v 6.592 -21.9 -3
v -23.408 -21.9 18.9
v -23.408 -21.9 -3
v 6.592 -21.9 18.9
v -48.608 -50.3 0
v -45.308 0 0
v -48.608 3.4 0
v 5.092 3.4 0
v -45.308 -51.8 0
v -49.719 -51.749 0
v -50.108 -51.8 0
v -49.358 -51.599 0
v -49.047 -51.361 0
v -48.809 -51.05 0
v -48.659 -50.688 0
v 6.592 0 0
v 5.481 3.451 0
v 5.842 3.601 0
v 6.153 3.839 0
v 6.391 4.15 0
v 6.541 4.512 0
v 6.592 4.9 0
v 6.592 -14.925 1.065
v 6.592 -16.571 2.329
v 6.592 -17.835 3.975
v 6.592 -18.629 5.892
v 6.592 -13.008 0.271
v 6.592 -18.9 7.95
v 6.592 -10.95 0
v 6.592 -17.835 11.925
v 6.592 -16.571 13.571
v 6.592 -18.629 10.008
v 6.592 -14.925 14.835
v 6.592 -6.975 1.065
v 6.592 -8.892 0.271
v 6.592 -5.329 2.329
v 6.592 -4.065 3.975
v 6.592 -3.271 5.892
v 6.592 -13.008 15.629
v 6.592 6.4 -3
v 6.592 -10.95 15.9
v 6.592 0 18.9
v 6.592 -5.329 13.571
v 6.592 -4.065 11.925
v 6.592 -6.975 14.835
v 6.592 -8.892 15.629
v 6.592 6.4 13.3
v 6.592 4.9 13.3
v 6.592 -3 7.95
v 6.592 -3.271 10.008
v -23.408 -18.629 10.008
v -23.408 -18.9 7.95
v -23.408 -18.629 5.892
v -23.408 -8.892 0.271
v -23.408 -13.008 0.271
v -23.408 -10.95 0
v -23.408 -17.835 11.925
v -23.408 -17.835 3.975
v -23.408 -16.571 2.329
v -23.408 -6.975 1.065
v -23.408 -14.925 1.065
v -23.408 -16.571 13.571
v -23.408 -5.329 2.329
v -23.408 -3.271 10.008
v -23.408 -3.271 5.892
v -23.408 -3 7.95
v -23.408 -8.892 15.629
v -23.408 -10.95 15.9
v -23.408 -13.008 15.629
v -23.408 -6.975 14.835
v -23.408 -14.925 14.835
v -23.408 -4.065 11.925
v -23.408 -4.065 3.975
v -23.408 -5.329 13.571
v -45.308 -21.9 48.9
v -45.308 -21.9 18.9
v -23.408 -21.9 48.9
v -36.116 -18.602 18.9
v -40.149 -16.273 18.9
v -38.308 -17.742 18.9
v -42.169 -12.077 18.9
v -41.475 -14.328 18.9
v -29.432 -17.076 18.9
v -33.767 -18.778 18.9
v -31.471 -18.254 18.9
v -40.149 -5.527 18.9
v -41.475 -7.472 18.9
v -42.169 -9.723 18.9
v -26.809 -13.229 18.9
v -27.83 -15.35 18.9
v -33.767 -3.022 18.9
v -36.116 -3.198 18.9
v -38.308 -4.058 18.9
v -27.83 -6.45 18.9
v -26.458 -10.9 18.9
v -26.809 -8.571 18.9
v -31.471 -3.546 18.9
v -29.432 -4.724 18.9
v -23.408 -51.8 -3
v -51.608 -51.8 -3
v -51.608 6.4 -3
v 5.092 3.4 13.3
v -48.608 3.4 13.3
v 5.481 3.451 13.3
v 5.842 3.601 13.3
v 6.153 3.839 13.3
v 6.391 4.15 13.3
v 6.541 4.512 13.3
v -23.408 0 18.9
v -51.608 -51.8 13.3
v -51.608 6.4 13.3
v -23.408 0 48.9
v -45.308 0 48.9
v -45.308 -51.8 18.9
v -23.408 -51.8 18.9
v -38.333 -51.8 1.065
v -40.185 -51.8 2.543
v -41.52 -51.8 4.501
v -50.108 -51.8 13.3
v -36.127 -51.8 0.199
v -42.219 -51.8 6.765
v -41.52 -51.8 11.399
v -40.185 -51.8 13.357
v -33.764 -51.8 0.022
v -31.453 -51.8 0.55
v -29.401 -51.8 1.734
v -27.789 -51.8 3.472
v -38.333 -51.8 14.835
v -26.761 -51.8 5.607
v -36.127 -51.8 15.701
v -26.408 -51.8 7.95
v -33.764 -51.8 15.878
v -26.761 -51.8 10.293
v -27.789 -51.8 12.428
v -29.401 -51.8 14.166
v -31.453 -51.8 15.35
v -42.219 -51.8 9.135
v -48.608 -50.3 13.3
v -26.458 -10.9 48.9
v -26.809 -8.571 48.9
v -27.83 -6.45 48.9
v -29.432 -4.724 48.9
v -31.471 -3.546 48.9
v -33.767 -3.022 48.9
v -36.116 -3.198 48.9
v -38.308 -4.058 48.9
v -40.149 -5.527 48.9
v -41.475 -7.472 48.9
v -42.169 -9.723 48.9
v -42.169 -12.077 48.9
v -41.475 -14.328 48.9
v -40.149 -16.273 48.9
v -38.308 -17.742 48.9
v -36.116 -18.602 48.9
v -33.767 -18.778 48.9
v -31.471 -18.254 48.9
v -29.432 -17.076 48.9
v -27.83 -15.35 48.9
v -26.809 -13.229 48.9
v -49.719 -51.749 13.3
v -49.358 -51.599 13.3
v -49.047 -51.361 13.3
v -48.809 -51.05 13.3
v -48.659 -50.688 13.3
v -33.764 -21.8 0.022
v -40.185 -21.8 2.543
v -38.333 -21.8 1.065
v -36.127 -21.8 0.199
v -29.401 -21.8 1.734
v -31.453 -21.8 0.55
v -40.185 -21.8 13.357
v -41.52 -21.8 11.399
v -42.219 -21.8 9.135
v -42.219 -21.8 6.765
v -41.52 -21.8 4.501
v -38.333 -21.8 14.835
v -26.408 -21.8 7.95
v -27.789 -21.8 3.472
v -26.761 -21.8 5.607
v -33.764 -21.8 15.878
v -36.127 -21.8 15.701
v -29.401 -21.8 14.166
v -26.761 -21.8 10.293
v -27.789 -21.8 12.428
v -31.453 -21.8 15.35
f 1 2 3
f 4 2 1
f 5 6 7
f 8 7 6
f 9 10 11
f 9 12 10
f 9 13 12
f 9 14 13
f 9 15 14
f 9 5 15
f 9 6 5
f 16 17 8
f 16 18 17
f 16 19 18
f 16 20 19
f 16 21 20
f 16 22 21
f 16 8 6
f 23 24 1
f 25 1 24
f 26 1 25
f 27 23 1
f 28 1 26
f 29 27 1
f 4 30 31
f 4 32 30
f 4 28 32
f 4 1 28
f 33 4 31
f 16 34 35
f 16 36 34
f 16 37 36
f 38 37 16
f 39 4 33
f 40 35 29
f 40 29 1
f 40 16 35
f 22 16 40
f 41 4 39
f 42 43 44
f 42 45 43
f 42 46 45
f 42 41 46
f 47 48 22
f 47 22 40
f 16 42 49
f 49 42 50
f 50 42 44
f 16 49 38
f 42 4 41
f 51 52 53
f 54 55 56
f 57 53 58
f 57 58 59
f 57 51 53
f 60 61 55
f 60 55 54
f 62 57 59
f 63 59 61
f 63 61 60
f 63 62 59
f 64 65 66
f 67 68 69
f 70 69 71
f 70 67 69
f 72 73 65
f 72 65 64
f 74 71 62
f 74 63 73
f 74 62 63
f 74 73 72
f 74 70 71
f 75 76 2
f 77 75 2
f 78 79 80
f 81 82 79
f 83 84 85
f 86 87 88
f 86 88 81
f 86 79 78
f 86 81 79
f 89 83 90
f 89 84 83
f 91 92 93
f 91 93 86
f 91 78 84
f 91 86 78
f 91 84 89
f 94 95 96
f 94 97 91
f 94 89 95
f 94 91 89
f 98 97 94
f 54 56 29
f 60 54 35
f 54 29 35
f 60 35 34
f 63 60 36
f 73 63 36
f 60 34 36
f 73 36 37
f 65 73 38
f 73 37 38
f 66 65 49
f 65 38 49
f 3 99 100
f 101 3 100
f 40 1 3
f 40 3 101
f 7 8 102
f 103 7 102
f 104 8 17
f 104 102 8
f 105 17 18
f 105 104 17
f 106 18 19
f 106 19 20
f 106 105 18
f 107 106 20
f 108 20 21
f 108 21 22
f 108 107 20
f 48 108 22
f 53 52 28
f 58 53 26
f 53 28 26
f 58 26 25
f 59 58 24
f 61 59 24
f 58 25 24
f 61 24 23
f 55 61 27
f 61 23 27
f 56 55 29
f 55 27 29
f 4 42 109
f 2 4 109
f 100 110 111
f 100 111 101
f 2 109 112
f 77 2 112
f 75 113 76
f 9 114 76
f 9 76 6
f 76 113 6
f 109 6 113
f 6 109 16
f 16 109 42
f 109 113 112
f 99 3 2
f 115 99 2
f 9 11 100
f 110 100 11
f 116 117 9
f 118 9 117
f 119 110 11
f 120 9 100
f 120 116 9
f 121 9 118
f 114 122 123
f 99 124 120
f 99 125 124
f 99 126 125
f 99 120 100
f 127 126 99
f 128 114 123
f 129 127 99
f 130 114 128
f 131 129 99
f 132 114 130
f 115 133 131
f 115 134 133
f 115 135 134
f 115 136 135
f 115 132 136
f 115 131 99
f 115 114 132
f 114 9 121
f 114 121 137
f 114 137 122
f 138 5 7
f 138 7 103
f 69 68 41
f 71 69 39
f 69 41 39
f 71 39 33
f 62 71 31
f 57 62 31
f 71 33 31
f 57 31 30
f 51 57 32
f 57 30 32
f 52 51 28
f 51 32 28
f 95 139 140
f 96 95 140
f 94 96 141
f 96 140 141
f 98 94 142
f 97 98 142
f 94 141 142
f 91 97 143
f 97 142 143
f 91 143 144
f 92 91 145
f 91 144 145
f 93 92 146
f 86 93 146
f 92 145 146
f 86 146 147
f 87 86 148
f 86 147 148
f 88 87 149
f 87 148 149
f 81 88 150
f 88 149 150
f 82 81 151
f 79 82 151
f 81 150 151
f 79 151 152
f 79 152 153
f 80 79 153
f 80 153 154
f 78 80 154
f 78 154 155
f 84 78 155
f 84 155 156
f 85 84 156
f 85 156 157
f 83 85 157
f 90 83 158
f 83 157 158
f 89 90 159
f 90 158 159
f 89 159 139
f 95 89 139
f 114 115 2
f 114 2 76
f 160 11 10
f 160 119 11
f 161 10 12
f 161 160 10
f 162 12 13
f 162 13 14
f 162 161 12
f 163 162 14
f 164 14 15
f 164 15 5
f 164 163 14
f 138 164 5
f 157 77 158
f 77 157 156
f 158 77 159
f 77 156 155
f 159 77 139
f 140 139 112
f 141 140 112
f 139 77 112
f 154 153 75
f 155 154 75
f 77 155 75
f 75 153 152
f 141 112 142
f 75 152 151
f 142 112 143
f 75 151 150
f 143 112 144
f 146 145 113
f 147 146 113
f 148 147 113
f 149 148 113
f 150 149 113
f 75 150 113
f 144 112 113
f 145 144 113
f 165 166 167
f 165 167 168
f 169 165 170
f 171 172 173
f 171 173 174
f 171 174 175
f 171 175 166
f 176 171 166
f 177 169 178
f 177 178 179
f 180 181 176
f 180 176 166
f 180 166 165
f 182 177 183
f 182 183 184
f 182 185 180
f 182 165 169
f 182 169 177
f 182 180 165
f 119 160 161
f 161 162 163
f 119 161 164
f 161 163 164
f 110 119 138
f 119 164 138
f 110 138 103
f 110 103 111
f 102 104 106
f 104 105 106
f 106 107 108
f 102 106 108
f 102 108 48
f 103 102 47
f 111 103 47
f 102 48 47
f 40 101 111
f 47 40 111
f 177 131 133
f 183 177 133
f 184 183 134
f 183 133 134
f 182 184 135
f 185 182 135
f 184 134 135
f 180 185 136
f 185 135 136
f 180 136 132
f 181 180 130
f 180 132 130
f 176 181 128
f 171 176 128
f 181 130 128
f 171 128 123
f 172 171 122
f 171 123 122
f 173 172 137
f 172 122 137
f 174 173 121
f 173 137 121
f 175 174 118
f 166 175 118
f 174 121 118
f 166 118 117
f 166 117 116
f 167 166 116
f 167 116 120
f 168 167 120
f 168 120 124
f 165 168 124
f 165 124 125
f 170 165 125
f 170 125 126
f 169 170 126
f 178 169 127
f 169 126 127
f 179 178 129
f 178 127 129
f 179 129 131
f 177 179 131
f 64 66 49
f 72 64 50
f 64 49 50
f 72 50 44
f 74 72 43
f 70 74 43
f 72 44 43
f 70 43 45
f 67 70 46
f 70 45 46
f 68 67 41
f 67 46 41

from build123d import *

# Parameters (mm, degrees)
F0_W      = 27
F0_H      = 15.9
F0_W_2    = 15.9
F0_H_2    = 27
F0_W_3    = 3
F0_H_3    = 3
F1_DEPTH  = 21.9
F2_DEPTH  = 51.8
F3_R      = 7.95
F6_DEPTH  = 30
F7_DEPTH  = 30
F4_R      = 7.9
F8_DEPTH  = 30
F10_DEPTH = 58.2
F11_W     = 3
F11_H     = 13.3
F13_R     = 1.5


with BuildPart() as f1:
    # F0 (on Front) → F1 (new body)
    with BuildSketch(Plane.XZ):
        with BuildLine():
            Line((-34.3576915575, 15.9), (-42.3076915575, 15.9))
            Line((-42.3076915575, 15.9), (-42.3076915575, 7.9499999931))
            ThreePointArc((-42.3076915575, 7.9499999931), (-39.9791904704, 13.571498908), (-34.3576915575, 15.9))
        make_face()
        with BuildLine():
            ThreePointArc((-34.3576915575, 15.9), (-39.9791904704, 13.571498908), (-42.3076915575, 7.9499999931))
            ThreePointArc((-42.3076915575, 7.9499999931), (-39.9791904655, 2.3285010871), (-34.3576915575, 0))
            ThreePointArc((-34.3576915575, 0), (-28.7361926471, 2.3285010896), (-26.4076915575, 7.95))
            ThreePointArc((-26.4076915575, 7.95), (-28.7361926471, 13.5714989104), (-34.3576915575, 15.9))
        make_face()
        Polygon((-42.3076915575, 18.9), (-42.3076915575, 45.9), (-26.4076915575, 45.9), (-26.4076915575, 18.9), (-23.4076915575, 18.9), (-23.4076915575, 48.9), (-45.3076915575, 48.9), (-45.3076915575, 18.9), align=None)
        with Locations((-9.9076915575, 7.95)):
            Rectangle(F0_W, F0_H)
        with Locations((-34.3576915575, 32.4)):
            Rectangle(F0_W_2, F0_H_2)
        with BuildLine():
            ThreePointArc((-34.3576915575, 0), (-39.9791904655, 2.3285010871), (-42.3076915575, 7.9499999931))
            Line((-42.3076915575, 7.9499999931), (-42.3076915575, 0))
            Line((-42.3076915575, 0), (-34.3576915575, 0))
        make_face()
        with BuildLine():
            Line((-26.4076915575, 0), (-26.4076915575, 7.95))
            ThreePointArc((-26.4076915575, 7.95), (-28.7361926471, 2.3285010896), (-34.3576915575, 0))
            Line((-34.3576915575, 0), (-26.4076915575, 0))
        make_face()
        with BuildLine():
            Line((-26.4076915575, 7.95), (-26.4076915575, 15.9))
            Line((-26.4076915575, 15.9), (-34.3576915575, 15.9))
            ThreePointArc((-34.3576915575, 15.9), (-28.7361926471, 13.5714989104), (-26.4076915575, 7.95))
        make_face()
        Polygon((6.5923084425, 18.9), (-23.4076915575, 18.9), (-23.4076915575, 15.9), (3.5923084425, 15.9), (3.5923084425, 0), (-23.4076915575, 0), (-23.4076915575, -3), (6.5923084425, -3), align=None)
        Polygon((-26.4076915575, 18.9), (-42.3076915575, 18.9), (-42.3076915575, 15.9), (-34.3576915575, 15.9), (-26.4076915575, 15.9), align=None)
        Polygon((-23.4076915575, 15.9), (-26.4076915575, 15.9), (-26.4076915575, 7.95), (-26.4076915575, 0), (-23.4076915575, 0), align=None)
        Polygon((-42.3076915575, 15.9), (-42.3076915575, 18.9), (-45.3076915575, 18.9), (-45.3076915575, -3), (-23.4076915575, -3), (-23.4076915575, 0), (-26.4076915575, 0), (-34.3576915575, 0), (-42.3076915575, 0), (-42.3076915575, 7.9499999931), align=None)
        with Locations((-24.9076915575, 17.4)):
            Rectangle(F0_W_3, F0_H_3)
    extrude(amount=F1_DEPTH)

    # F0 (on Front) → F2 (join)
    with BuildSketch(Plane.XZ):
        Polygon((-42.3076915575, 15.9), (-42.3076915575, 18.9), (-45.3076915575, 18.9), (-45.3076915575, -3), (-23.4076915575, -3), (-23.4076915575, 0), (-26.4076915575, 0), (-34.3576915575, 0), (-42.3076915575, 0), (-42.3076915575, 7.9499999931), align=None)
        with BuildLine():
            ThreePointArc((-34.3576915575, 15.9), (-39.9791904704, 13.571498908), (-42.3076915575, 7.9499999931))
            ThreePointArc((-42.3076915575, 7.9499999931), (-39.9791904655, 2.3285010871), (-34.3576915575, 0))
            ThreePointArc((-34.3576915575, 0), (-28.7361926471, 2.3285010896), (-26.4076915575, 7.95))
            ThreePointArc((-26.4076915575, 7.95), (-28.7361926471, 13.5714989104), (-34.3576915575, 15.9))
        make_face()
        Polygon((-26.4076915575, 18.9), (-42.3076915575, 18.9), (-42.3076915575, 15.9), (-34.3576915575, 15.9), (-26.4076915575, 15.9), align=None)
        Polygon((-23.4076915575, 15.9), (-26.4076915575, 15.9), (-26.4076915575, 7.95), (-26.4076915575, 0), (-23.4076915575, 0), align=None)
        with Locations((-24.9076915575, 17.4)):
            Rectangle(F0_W_3, F0_H_3)
        with BuildLine():
            Line((-26.4076915575, 7.95), (-26.4076915575, 15.9))
            Line((-26.4076915575, 15.9), (-34.3576915575, 15.9))
            ThreePointArc((-34.3576915575, 15.9), (-28.7361926471, 13.5714989104), (-26.4076915575, 7.95))
        make_face()
        with BuildLine():
            Line((-34.3576915575, 15.9), (-42.3076915575, 15.9))
            Line((-42.3076915575, 15.9), (-42.3076915575, 7.9499999931))
            ThreePointArc((-42.3076915575, 7.9499999931), (-39.9791904704, 13.571498908), (-34.3576915575, 15.9))
        make_face()
        with BuildLine():
            ThreePointArc((-34.3576915575, 0), (-39.9791904655, 2.3285010871), (-42.3076915575, 7.9499999931))
            Line((-42.3076915575, 7.9499999931), (-42.3076915575, 0))
            Line((-42.3076915575, 0), (-34.3576915575, 0))
        make_face()
        with BuildLine():
            Line((-26.4076915575, 0), (-26.4076915575, 7.95))
            ThreePointArc((-26.4076915575, 7.95), (-28.7361926471, 2.3285010896), (-34.3576915575, 0))
            Line((-34.3576915575, 0), (-26.4076915575, 0))
        make_face()
    extrude(amount=F2_DEPTH)

    # F3 (on face) → F6 (cut)
    with BuildSketch(Plane.XZ.offset(51.8)):
        with Locations((-34.3576915575, 7.95)):
            Circle(F3_R)
    extrude(amount=-F6_DEPTH, mode=Mode.SUBTRACT)

    # F5 (on face) → F7 (cut)
    with BuildSketch(Plane.YZ.offset(6.5923084425)):
        with BuildLine():
            ThreePointArc((-3, 7.95), (-5.3285010896, 13.5714989104), (-10.95, 15.9))
            ThreePointArc((-10.95, 15.9), (-16.5714989104, 13.5714989104), (-18.9, 7.95))
            ThreePointArc((-18.9, 7.95), (-16.5714989104, 2.3285010896), (-10.95, 0))
            ThreePointArc((-10.95, 0), (-5.3285010896, 2.3285010896), (-3, 7.95))
        make_face()
    extrude(amount=-F7_DEPTH, mode=Mode.SUBTRACT)

    # F4 (on face) → F8 (cut)
    with BuildSketch(Plane.XY.offset(48.9)):
        with Locations((-34.3576915575, -10.9)):
            Circle(F4_R)
    extrude(amount=-F8_DEPTH, mode=Mode.SUBTRACT)

    # F9 (on face) → F10 (join)
    with BuildSketch(Plane.XZ.offset(51.8)):
        Polygon((-51.6076915575, -3), (-45.3076915575, -3), (-45.3076915575, 0), (-48.6076915575, 0), (-48.6076915575, 13.3), (-51.6076915575, 13.3), align=None)
    extrude(amount=-F10_DEPTH)

    # F11 (on face) → F12 (join, up to the next surface of F1)
    with BuildSketch(Plane.YZ.offset(6.5923084425)):
        Polygon((6.4, -3), (6.4, 0), (3.4, 0), (0, 0), (0, -3), align=None)
        with Locations((4.9, 6.65)):
            Rectangle(F11_W, F11_H)
    extrude(until=Until.NEXT, dir=(-1, 0, 0))

    # F13
    f13_edges = [f1.edges().sort_by_distance(p)[0] for p in [
        (6.592308, 3.4, 6.65),
        (-48.607692, -51.8, 6.65),
    ]]
    fillet(f13_edges, radius=F13_R)


solid = f1.part
